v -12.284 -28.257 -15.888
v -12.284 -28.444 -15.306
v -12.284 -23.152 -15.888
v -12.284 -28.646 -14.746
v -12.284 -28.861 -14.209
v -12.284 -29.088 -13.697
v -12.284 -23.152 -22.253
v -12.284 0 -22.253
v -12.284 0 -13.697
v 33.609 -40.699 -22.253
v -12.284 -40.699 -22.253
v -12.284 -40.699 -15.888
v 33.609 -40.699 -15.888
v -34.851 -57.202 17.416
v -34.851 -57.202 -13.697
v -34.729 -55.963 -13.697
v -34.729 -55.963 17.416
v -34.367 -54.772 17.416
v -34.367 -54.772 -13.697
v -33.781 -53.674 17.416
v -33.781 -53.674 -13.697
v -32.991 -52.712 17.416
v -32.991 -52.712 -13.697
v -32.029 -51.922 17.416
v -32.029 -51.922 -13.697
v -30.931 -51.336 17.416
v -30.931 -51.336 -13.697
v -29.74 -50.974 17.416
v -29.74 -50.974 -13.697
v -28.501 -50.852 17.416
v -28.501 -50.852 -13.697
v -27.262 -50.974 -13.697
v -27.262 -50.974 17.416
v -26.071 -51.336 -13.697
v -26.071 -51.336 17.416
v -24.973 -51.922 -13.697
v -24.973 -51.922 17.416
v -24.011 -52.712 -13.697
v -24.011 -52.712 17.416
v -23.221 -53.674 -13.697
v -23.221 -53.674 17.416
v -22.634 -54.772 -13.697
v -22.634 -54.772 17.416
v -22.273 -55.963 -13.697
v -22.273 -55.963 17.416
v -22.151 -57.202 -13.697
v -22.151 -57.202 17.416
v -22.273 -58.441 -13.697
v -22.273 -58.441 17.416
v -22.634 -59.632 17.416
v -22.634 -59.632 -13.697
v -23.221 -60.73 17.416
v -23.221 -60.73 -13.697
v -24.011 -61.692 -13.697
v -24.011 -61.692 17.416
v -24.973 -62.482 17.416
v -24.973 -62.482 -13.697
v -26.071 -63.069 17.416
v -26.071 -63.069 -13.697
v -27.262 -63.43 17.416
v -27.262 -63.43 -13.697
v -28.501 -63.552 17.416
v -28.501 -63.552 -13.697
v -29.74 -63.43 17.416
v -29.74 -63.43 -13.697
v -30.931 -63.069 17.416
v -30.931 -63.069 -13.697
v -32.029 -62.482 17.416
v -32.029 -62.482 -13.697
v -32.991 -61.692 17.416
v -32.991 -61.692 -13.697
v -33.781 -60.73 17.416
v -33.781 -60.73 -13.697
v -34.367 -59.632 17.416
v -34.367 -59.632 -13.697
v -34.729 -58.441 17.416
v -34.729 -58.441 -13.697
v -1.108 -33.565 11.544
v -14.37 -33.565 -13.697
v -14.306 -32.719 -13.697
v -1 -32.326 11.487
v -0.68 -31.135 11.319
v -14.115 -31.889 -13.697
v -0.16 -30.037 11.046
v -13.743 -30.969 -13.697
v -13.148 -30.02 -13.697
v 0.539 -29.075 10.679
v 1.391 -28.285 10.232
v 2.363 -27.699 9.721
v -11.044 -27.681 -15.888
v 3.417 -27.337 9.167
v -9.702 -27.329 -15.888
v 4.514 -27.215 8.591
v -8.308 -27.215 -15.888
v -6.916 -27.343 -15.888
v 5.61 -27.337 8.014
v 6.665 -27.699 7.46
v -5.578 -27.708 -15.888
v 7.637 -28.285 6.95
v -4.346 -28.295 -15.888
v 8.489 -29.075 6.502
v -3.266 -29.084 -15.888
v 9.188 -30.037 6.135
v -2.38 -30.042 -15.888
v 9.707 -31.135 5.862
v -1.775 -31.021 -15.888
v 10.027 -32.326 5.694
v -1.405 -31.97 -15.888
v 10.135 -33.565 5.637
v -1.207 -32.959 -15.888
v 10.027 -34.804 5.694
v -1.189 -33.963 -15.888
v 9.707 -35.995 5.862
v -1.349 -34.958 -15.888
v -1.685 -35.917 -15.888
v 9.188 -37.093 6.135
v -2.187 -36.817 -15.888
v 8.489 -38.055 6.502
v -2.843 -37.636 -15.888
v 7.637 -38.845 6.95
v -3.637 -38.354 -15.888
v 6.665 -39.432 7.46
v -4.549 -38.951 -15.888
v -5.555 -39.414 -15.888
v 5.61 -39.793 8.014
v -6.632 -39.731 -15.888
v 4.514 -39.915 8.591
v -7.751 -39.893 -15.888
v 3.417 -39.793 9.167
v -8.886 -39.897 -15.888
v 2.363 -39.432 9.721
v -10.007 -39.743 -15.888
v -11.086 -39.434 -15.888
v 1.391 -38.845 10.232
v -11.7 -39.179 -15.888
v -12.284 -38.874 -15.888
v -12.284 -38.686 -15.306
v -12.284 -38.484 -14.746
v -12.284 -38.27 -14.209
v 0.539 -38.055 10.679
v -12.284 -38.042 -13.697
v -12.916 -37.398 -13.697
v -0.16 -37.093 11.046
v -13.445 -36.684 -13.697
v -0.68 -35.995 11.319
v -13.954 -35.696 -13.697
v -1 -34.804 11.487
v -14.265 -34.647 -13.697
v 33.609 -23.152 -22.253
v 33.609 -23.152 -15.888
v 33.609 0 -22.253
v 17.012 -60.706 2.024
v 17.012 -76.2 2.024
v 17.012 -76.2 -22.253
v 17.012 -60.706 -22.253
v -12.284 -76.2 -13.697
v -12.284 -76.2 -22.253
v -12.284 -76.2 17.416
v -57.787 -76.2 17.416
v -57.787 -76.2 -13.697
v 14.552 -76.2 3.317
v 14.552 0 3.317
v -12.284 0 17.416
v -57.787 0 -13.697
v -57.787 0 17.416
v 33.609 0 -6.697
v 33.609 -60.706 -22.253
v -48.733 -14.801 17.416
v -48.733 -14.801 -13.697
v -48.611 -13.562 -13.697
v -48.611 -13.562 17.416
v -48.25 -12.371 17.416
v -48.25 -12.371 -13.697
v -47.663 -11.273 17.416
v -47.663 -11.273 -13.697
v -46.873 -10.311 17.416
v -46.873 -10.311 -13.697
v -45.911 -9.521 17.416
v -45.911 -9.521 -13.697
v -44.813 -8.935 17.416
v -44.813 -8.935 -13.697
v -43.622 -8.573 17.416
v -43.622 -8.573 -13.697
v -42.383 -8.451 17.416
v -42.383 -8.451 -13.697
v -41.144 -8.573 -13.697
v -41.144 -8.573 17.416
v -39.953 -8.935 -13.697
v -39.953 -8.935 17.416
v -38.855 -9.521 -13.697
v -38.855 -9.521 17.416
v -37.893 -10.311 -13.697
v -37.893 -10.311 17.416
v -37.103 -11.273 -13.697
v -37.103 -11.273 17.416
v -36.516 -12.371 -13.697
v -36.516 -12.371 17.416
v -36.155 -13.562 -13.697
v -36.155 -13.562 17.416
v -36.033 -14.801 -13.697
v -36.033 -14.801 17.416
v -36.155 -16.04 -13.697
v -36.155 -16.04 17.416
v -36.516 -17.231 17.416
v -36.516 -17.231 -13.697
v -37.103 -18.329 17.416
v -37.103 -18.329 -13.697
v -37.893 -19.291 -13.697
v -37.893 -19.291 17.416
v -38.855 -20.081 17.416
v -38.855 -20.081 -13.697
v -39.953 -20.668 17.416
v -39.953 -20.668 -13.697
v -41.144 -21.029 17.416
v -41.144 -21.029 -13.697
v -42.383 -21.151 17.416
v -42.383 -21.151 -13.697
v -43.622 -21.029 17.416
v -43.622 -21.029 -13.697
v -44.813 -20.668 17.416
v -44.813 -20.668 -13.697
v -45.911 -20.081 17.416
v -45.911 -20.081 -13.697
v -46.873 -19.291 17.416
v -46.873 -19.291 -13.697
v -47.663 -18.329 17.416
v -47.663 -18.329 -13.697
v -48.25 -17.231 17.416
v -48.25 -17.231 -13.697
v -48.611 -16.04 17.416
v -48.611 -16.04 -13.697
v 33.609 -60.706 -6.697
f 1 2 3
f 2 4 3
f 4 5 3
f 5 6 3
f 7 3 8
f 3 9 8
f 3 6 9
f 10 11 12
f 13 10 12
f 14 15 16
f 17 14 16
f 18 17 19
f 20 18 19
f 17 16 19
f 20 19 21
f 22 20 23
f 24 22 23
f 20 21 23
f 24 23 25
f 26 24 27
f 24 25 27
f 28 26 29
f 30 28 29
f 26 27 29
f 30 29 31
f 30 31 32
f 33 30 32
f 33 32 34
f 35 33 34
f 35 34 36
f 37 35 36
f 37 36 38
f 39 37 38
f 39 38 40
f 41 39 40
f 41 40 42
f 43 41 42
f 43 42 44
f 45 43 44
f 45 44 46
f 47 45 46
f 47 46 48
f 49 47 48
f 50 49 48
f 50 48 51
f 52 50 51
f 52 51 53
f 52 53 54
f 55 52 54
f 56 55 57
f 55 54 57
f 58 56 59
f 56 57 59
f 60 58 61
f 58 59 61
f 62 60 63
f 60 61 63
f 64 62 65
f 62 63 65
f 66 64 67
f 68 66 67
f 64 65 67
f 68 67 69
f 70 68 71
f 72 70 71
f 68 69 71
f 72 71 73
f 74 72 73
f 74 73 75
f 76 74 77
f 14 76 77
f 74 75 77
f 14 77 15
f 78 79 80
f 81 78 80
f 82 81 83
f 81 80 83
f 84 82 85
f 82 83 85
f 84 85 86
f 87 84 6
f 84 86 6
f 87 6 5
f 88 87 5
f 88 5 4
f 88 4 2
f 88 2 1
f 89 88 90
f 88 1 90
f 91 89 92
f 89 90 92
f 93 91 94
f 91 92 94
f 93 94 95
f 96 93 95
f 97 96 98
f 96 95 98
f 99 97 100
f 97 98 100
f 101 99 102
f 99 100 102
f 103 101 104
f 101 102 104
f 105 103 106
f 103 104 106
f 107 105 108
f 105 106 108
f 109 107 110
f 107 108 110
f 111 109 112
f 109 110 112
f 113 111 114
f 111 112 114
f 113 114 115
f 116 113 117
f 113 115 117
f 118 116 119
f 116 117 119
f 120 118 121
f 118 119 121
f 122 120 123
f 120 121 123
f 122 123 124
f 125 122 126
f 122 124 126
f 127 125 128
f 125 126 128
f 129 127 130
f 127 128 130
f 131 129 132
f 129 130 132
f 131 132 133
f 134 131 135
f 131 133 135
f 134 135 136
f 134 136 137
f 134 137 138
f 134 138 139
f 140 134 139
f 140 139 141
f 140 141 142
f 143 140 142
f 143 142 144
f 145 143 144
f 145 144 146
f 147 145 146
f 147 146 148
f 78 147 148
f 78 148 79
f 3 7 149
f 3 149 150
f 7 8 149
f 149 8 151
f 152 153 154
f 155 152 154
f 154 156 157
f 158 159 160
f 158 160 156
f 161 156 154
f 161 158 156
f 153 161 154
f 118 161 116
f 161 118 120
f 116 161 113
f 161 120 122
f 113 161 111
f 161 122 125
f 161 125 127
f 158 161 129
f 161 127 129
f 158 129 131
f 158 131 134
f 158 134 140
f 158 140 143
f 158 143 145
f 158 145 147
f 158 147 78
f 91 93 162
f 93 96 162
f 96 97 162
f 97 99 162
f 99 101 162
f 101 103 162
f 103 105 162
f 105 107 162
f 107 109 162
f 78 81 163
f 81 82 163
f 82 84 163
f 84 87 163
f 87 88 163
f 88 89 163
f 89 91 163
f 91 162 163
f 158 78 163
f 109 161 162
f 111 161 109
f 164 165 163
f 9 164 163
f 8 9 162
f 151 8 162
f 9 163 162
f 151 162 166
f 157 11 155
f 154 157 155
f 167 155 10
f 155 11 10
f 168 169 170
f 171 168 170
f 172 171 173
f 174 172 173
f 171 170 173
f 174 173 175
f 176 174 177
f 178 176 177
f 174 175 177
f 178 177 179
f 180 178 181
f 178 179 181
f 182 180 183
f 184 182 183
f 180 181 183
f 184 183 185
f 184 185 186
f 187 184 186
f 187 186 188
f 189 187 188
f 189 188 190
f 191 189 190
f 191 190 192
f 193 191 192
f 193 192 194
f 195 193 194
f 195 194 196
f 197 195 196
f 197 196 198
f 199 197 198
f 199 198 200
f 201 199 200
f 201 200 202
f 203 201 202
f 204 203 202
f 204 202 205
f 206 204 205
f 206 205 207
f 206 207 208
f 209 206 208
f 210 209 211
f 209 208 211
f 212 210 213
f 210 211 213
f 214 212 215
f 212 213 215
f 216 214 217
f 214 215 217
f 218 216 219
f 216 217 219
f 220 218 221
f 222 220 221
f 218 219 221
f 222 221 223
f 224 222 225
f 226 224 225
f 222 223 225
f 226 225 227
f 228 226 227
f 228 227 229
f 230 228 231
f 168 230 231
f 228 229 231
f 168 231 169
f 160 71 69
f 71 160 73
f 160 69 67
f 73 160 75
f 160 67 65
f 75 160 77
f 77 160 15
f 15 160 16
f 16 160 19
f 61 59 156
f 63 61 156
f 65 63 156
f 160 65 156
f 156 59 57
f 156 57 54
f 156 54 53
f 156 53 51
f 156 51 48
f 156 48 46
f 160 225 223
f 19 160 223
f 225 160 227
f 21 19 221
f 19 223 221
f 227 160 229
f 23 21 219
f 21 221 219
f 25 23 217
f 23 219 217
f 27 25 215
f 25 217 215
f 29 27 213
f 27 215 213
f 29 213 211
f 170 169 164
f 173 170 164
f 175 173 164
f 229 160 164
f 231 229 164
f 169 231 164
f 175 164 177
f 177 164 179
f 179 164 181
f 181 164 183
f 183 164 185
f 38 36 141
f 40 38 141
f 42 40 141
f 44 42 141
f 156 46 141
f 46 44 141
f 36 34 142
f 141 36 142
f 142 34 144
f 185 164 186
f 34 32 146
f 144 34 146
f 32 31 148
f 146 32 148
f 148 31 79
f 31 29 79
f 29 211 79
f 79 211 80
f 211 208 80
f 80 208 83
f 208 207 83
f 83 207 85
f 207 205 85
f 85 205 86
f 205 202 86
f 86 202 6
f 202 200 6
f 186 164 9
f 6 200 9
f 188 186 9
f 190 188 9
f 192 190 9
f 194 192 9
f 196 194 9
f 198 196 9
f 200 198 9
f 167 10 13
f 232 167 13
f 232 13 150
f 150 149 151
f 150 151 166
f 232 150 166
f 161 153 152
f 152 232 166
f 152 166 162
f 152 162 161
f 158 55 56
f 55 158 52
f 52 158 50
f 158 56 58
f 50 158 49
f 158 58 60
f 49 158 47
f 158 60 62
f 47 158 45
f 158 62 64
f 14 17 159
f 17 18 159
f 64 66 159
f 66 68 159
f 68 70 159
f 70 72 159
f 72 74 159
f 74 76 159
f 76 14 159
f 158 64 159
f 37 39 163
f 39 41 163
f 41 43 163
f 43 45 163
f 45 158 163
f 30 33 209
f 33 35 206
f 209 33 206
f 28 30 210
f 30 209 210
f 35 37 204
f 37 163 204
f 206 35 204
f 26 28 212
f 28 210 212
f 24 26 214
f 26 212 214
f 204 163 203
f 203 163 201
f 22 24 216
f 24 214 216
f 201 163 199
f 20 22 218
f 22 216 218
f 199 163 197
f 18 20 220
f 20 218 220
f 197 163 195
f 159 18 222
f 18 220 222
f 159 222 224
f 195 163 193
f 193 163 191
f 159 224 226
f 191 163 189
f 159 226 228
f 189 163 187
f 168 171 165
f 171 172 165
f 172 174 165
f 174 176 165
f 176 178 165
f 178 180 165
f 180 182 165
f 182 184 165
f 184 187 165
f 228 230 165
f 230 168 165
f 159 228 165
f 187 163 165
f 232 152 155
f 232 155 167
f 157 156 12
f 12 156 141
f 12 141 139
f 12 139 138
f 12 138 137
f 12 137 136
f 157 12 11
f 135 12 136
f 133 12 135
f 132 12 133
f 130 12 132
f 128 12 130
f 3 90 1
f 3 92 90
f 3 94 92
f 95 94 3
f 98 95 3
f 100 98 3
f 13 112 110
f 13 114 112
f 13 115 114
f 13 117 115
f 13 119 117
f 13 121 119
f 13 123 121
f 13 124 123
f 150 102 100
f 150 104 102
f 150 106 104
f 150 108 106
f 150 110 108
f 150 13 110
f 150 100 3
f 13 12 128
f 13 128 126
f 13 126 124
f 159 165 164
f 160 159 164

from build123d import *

# Parameters (mm, degrees)
F1_DEPTH = 76.2
F3_D     = 12.7
F5_DEPTH = 15.494
F6_W     = 17.5469946116
F6_H     = 6.365576759
F7_DEPTH = 76.2
F9_D     = 12.7


with BuildPart() as f1:
    # F0 (on Front) → F1 (new body)
    with BuildSketch(Plane.XZ):
        Polygon((-12.2837694362, 17.4164939672), (-57.7873364091, 17.4164939672), (-57.7873364091, -13.6970570311), (-12.2837694362, -13.6970570311), (-12.2837694362, -22.2532823682), (14.5516674966, -22.2532823682), (14.5516674966, 3.3165175266), align=None)
        Polygon((33.6087159812, -6.6965087317), (14.5516674966, 3.3165175266), (14.5516674966, -22.2532823682), (33.6087159812, -22.2532823682), align=None)
    extrude(amount=F1_DEPTH)

    # F3 (through all)
    with Locations(Plane.XY.offset(17.4164939672)):
        with Locations((-42.3829220235, -14.8011986166), (-28.5008102655, -57.2022236884)):
            Hole(F3_D / 2)

    # F4 (on face) → F5 (cut)
    with BuildSketch(Plane.XZ.offset(76.2)):
        Polygon((33.6087159812, -6.6965087317), (17.0117028464, 2.023956479), (17.0117028464, -22.2532823682), (33.6087159812, -22.2532823682), align=None)
    extrude(amount=-F5_DEPTH, mode=Mode.SUBTRACT)

    # F6 (on face) → F7 (cut)
    with BuildSketch(Plane.YZ.offset(33.6087159812)):
        with Locations((-31.9253103808, -19.0704939887)):
            Rectangle(F6_W, F6_H)
    extrude(amount=-F7_DEPTH, mode=Mode.SUBTRACT)

    # F9 (through all)
    with Locations(Plane(origin=(4.5137471869, 0, 8.5906794578), x_dir=(0.8852434605, 0, -0.4651279563), z_dir=(0.4651279563, 0, 0.8852434605))):
        with Locations((0, -33.5651822388)):
            Hole(F9_D / 2)


solid = f1.part
